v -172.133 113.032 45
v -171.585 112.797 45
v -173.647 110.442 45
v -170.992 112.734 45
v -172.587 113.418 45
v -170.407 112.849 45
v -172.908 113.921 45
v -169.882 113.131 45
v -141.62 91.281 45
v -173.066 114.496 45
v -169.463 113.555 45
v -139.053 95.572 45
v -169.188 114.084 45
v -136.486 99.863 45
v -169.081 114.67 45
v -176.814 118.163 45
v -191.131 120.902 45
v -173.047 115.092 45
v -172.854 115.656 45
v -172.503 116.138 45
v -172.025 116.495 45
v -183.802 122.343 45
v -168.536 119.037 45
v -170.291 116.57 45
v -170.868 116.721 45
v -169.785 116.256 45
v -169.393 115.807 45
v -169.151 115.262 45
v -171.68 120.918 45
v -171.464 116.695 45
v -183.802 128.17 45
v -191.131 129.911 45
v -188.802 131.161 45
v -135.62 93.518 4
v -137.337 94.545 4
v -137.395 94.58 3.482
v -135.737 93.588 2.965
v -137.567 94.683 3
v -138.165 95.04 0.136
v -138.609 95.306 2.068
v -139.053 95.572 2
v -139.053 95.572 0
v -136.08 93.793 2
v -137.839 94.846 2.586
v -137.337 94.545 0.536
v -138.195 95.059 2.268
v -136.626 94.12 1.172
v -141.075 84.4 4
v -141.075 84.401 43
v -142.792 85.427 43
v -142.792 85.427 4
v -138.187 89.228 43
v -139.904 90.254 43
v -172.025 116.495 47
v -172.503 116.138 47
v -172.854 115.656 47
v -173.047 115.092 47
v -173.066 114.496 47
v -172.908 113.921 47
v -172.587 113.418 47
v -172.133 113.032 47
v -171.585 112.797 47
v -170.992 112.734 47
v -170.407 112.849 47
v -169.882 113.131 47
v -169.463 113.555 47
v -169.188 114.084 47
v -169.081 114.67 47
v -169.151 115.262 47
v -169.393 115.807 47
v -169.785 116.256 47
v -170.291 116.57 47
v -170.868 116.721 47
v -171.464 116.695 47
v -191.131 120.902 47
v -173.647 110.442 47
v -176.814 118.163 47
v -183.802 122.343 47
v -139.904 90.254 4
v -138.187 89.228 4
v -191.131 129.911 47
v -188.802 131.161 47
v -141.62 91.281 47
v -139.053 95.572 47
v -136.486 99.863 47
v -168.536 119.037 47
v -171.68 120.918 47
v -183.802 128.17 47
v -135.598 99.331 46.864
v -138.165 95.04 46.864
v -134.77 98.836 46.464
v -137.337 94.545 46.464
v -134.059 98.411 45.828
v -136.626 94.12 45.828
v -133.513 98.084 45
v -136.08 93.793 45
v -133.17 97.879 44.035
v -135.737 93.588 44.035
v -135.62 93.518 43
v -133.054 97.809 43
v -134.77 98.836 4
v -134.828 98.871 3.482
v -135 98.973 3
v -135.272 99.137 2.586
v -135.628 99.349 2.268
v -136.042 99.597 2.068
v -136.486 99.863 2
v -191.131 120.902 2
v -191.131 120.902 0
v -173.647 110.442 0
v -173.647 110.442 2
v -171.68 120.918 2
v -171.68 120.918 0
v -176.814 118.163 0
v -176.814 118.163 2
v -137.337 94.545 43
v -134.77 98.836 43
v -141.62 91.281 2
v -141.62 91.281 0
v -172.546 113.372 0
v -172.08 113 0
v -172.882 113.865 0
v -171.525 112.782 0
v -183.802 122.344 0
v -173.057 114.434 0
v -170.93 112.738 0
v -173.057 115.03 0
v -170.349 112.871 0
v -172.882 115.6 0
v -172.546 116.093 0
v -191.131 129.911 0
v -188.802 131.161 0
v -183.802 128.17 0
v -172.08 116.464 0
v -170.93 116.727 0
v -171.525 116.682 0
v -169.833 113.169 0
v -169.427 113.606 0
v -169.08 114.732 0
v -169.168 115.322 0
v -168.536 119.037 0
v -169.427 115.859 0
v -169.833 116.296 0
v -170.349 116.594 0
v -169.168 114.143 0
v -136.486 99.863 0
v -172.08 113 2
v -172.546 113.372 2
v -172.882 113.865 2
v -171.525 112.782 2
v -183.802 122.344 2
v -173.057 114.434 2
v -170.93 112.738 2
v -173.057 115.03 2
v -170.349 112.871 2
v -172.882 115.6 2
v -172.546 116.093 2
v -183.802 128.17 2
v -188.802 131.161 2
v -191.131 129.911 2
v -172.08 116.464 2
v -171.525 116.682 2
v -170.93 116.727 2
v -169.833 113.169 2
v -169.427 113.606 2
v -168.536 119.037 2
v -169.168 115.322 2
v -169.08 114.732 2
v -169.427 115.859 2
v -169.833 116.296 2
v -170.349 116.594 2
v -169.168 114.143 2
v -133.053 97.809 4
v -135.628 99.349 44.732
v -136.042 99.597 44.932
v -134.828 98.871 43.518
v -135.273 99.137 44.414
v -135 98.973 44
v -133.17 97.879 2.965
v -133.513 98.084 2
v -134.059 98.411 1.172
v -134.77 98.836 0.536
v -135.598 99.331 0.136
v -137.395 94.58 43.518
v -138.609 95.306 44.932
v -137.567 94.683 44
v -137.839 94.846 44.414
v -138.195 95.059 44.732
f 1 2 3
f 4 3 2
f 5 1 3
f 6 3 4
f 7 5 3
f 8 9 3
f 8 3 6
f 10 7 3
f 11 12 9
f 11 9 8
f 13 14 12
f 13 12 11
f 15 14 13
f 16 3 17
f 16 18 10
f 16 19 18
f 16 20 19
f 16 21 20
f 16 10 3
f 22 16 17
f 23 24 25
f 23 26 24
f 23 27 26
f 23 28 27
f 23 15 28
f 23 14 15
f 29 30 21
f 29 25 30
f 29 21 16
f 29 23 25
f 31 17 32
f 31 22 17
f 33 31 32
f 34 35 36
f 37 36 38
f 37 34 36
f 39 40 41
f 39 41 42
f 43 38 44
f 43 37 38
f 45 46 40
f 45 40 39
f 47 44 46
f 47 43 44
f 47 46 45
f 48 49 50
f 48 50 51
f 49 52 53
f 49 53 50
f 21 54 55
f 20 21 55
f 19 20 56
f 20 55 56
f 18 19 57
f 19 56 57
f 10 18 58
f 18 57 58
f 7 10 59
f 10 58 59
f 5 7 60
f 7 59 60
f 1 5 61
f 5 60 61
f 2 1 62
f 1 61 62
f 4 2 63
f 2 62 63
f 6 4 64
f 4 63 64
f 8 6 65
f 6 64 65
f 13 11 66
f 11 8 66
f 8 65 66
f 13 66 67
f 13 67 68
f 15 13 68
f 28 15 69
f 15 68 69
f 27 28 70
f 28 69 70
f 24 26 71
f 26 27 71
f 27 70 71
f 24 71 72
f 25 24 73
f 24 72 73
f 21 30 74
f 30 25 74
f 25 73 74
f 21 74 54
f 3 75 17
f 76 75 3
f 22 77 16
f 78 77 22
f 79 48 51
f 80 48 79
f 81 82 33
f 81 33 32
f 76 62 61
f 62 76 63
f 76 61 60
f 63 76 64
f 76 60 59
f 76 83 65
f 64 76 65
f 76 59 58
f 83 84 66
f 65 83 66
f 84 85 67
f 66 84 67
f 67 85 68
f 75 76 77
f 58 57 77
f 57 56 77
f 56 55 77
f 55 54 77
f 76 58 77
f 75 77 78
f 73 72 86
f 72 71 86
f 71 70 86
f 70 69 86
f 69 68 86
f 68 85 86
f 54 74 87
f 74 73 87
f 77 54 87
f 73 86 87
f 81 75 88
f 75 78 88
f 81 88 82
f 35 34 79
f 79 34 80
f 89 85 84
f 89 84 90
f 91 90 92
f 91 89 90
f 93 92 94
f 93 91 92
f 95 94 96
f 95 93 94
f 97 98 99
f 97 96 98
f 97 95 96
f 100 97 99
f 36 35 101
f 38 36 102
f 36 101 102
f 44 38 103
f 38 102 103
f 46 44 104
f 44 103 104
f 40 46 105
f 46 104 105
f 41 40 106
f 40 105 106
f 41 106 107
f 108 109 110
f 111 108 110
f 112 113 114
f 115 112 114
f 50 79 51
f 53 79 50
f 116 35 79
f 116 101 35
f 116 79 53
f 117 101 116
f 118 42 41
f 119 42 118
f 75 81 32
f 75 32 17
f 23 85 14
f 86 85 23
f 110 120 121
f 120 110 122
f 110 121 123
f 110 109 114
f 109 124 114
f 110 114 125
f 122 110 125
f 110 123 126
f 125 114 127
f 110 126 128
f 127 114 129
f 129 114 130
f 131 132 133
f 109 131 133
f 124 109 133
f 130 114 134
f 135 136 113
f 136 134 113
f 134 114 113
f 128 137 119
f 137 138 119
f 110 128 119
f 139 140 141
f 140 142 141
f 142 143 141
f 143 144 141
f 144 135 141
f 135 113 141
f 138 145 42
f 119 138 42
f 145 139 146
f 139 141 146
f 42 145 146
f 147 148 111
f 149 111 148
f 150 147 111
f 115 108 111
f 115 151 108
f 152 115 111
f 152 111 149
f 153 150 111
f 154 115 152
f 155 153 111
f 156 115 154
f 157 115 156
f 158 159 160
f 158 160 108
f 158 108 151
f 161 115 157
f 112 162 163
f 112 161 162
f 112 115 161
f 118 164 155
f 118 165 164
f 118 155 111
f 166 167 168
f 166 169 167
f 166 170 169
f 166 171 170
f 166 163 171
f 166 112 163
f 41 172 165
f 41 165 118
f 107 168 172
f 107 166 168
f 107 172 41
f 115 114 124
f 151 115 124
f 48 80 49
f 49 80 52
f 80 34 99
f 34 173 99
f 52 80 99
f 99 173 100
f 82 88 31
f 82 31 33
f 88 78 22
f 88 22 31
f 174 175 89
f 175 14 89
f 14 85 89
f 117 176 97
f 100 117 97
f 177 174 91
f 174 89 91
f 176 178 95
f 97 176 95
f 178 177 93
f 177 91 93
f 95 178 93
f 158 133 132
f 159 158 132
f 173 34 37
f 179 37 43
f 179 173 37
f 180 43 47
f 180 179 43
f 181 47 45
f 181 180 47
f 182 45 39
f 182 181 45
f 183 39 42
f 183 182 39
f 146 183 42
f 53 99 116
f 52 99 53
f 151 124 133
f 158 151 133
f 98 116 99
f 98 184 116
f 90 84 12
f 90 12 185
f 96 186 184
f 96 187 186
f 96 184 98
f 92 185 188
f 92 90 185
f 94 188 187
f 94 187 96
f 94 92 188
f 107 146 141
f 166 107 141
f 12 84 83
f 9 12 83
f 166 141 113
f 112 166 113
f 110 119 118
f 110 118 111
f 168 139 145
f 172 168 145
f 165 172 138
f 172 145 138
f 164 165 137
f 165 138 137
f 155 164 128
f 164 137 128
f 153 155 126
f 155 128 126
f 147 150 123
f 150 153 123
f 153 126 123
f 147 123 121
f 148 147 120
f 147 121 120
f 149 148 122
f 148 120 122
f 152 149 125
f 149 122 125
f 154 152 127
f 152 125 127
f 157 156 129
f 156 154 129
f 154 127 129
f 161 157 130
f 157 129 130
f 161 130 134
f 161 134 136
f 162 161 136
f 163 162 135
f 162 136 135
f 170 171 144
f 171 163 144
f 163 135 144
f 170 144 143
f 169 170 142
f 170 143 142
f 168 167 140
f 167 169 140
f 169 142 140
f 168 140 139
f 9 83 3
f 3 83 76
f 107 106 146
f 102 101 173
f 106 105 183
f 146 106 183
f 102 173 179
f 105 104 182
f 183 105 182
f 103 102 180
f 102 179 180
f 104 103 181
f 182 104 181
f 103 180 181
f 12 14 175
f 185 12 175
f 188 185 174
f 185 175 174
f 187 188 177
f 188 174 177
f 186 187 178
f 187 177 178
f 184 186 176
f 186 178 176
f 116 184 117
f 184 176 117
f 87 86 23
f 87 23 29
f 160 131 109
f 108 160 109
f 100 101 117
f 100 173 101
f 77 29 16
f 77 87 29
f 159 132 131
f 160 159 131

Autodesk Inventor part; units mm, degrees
ref_plane "YZ Plane" through (0, 0, 0) normal (1, 0, 0) x (0, 1, 0)
ref_plane "XZ Plane" through (0, 0, 0) normal (0, 1, 0) x (-1, 0, 0)
ref_plane "XY Plane" through (0, 0, 0) normal (0, 0, 1) x (1, 0, 0)
sketch "Sketch3" plane through (0, 0, 0) normal (0, 0, 1) x (1, 0, 0)
  circle A0 centre (367.816, 50) radius 50 construction
  line L0 (367.816, 0) -> (512.7041, 0) construction
  line L1 (367.816, 50) -> (512.7041, 50) construction
  line L2 (367.816, 100) -> (512.7041, 100) construction
  line L3 (367.816, 50) -> (342.816, 6.6987) construction
  line L4 (367.816, 50) -> (324.5147, 25) construction
  line L5 (367.816, 50) -> (324.5147, 75) construction
  line L6 (342.816, 93.3013) -> (367.816, 50) construction
  line L7 (392.816, 93.3013) -> (367.816, 50) construction
  line L8 (411.1173, 75) -> (367.816, 50) construction
  line L9 (411.1173, 25) -> (367.816, 50) construction
  line L10 (392.816, 6.6987) -> (367.816, 50) construction
  line L11 (367.816, 0) -> (367.816, 100) construction
  line L12 (417.816, 50) -> (367.816, 50) construction
  line L13 (341.6361, 0) -> (341.6361, 100) construction
  line L14 (315.4561, 0) -> (315.4561, 100) construction
  line L15 (289.2762, 0) -> (289.2762, 100) construction
  line L16 (263.0963, 0) -> (263.0963, 100) construction
  line L17 (236.9163, 0) -> (236.9163, 100) construction
  line L18 (210.7364, 0) -> (210.7364, 100) construction
  line L19 (184.5564, 0) -> (184.5564, 100) construction
  line L20 (158.3765, 0) -> (158.3765, 100) construction
  circle A1 centre (315.4561, 50) radius 50 construction
  circle A2 centre (341.6361, 50) radius 50 construction
  circle A3 centre (289.2762, 50) radius 50 construction
  circle A4 centre (263.0963, 50) radius 50 construction
  circle A5 centre (236.9163, 50) radius 50 construction
  circle A6 centre (210.7364, 50) radius 50 construction
  line L21 (392.816, 6.6987) -> (512.7041, 6.6987) construction
  line L22 (411.1173, 25) -> (512.7041, 25) construction
  line L23 (411.1173, 75) -> (512.7041, 75) construction
  line L24 (411.1173, 75) -> (512.7041, 75) construction
  line L25 (392.816, 93.3013) -> (512.7041, 93.3013) construction
  line L26 (358.7574, 75) -> (339.2762, 50) construction
  line L27 (339.2762, 50) -> (306.3975, 25) construction
  line L28 (306.3975, 25) -> (261.9163, 6.6987) construction
  line L29 (261.9163, 6.6987) -> (210.7364, 0) construction
  line L30 (105.3682, -12.9392) -> (105.3682, 124.4333) construction
  line L31 (21.25, 0) -> (21.25, 12)
  line L32 (35.45, 12) -> (35.45, -11.8433)
  arc A7 (0, 0) -> (6.625, -9.8433) centre (10.625, 0) ccw
  arc A8 (14.625, -9.8433) -> (21.25, 0) centre (10.625, 0) ccw
  line L33 (35.45, -11.8433) -> (14.625, -11.8433)
  line L34 (6.625, -11.8433) -> (-195.0796, -11.8433)
  circle A9 centre (-144.26, 100.8473) radius 12.875 construction
  line L35 (6.625, -11.8433) -> (6.625, -9.8433)
  line L36 (14.625, -11.8433) -> (14.625, -9.8433)
  line L37 (411.1173, 75) -> (158.3765, 75) construction
  line L38 (367.816, 100) -> (158.3765, 100) construction
  line L39 (417.816, 50) -> (158.3765, 50) construction
  line L40 (411.1173, 25) -> (158.3765, 25) construction
  line L41 (392.816, 6.6987) -> (158.3765, 6.6987) construction
  line L42 (392.816, 93.3013) -> (158.3765, 93.3013) construction
  line L43 (358.7574, 75) -> (366.6361, 93.3013) construction
  line L44 (366.6361, 93.3013) -> (367.816, 100) construction
  spline S0 degree 4 poles (-157.0796, 100) (-157.0796, 88.9946) (-147.011, 72.6811) (-131.8577, 48.7932) (-88.4777, 17.6268) (-50.0176, 3.937) (-18.8717, 0) (0, 0) knots 0 0 0 0 0 0.264547 0.457223 0.66608 1 1 1 1 1
  line L45 (-157.0796, 100) -> (-157.0796, 38) construction
  line L46 (0, 0) -> (-157.0796, 0) construction
  line L47 (-144.26, 100.8473) -> (-157.135, 100.8473) construction
  circle A10 centre (-146.4546, 100) radius 10.625 construction
  line L48 (-146.4546, 100) -> (-157.0796, 100) construction
  line L49 (-141.0754, 84.4005) -> (-135.6205, 93.5183) construction
  line L50 (-141.0796, 132.0528) -> (-171.0796, 149.3733) construction
  line L51 (-171.0796, 149.3733) -> (-201.0796, 132.0528) construction
  line L52 (-141.0754, 84.4005) -> (-99.2801, 84.4005) construction
  line L53 (-201.0796, 132.0528) -> (-201.0796, 97.4118) construction
  line L54 (-201.0796, 97.4118) -> (-171.0796, 80.0913) construction
  line L55 (0, 0) -> (-157.0796, 93.9753) construction
  line L56 (-135.6205, 93.5183) -> (-137.3368, 94.5451) construction
  line L57 (-137.3368, 94.5451) -> (-143.2815, 84.6085) construction
  line L58 (-137.3368, 94.5451) -> (-171.0796, 114.7323) construction
  line L59 (-201.0796, 132.0528) -> (-171.0796, 114.7323) construction
  arc A11 (-137.3368, 94.5451) -> (-144.7045, 143.8948) centre (-171.0796, 114.7323) ccw construction
  arc A12 (-142.7917, 85.4273) -> (-147.1443, 147.6882) centre (-171.0796, 114.7323) ccw construction
  line L60 (-171.0796, 80.0913) -> (-171.0796, 35)
  circle A13 centre (-171.0796, 114.7323) radius 2.5 construction
  arc A14 (-167.4345, 120.8251) -> (-174.7248, 108.6394) centre (-171.0796, 114.7323) ccw construction
  line L61 (-167.4345, 120.8251) -> (-157.0796, 114.6302) construction
  line L62 (-171.0796, 80.0913) -> (-171.0796, 106.4587)
  line L63 (-171.0796, 106.4587) -> (-174.7248, 108.6394) construction
  line L64 (-171.0796, 35) -> (-191.5296, 23.1932)
  arc A15 (-191.5296, 23.1932) -> (-195.0796, 17.0444) centre (-187.9796, 17.0444) ccw
  line L65 (-195.0796, 17.0444) -> (-195.0796, -11.8433)
  arc A16 (35.45, 12) -> (21.25, 12) centre (28.35, 12) ccw
  line L66 (-157.0796, 114.6302) -> (-157.0796, 99.9865) construction
  circle A17 centre (-164.0796, 103.4587) radius 2.5
  line L67 (-171.0796, 103.4587) -> (-157.0796, 103.4587) construction
  circle A18 centre (-185.1284, 15.3983) radius 2.5
  line L68 (-185.1284, 15.3983) -> (-194.1284, 20.5944) construction
  circle A19 centre (-6, -5.9217) radius 2.5
  line L69 (-6, -11.8433) -> (-6, 0) construction
  circle A20 centre (28.35, 12) radius 2.5
  circle A21 centre (28.35, -5.9217) radius 2.5
  line L70 (-167.4345, 320.8251) -> (-157.0796, 314.6302) construction
  arc A22 (-167.4345, 320.8251) -> (-174.7248, 308.6394) centre (-171.0796, 314.7323) ccw construction
  circle A23 centre (-171.0796, 314.7323) radius 2.5 construction
  line L71 (-171.0796, 280.0913) -> (-171.0796, 306.4587)
  line L72 (-171.0796, 306.4587) -> (-174.7248, 308.6394) construction
  line L73 (-157.0796, 314.6302) -> (-157.0796, 299.9865) construction
  circle A24 centre (-164.0796, 303.4587) radius 2.5
  spline S1 degree 4 poles (-157.0796, 300) (-157.0796, 288.9946) (-147.0234, 272.6841) (-124.1789, 236.7977) (-70.8039, 208.0704) (-31.8865, 200.2943) (0, 200) knots 0 0 0 0 0 0.264547 0.457223 1 1 1 1 1 construction
  line L74 (-157.0796, 300) -> (-157.0796, 238) construction
  arc A25 (0, 200) -> (6.625, 190.1567) centre (10.625, 200) ccw
  line L75 (35.45, 212) -> (35.45, 188.1567)
  circle A26 centre (28.35, 212) radius 2.5
  circle A27 centre (28.35, 194.0783) radius 2.5
  arc A28 (35.45, 212) -> (21.25, 212) centre (28.35, 212) ccw
  line L76 (21.25, 200) -> (21.25, 212)
  line L77 (35.45, 188.1567) -> (14.625, 188.1567)
  arc A29 (14.625, 190.1567) -> (21.25, 200) centre (10.625, 200) ccw
  line L78 (14.625, 188.1567) -> (14.625, 190.1567)
  line L79 (-185.1284, 215.3983) -> (-194.1284, 220.5944) construction
  arc A30 (-191.5296, 223.1932) -> (-195.0796, 217.0444) centre (-187.9796, 217.0444) ccw
  line L80 (-195.0796, 217.0444) -> (-195.0796, 188.1567)
  line L81 (-171.0796, 235) -> (-191.5296, 223.1932)
  circle A31 centre (-185.1284, 215.3983) radius 2.5
  line L82 (-171.0796, 280.0913) -> (-171.0796, 235)
  line L83 (6.625, 188.1567) -> (-195.0796, 188.1567)
  line L84 (6.625, 188.1567) -> (6.625, 190.1567)
  line L85 (-137.3368, 294.5451) -> (-143.2815, 284.6085) construction
  line L86 (-141.0754, 284.4005) -> (-135.6205, 293.5183) construction
  line L87 (0, 200) -> (-157.0796, 293.9753)
  line L88 (-167.4345, 520.8251) -> (-157.0796, 514.6302) construction
  arc A32 (-167.4345, 520.8251) -> (-174.7248, 508.6394) centre (-171.0796, 514.7323) ccw construction
  circle A33 centre (-171.0796, 514.7323) radius 2.5 construction
  line L89 (-171.0796, 480.0913) -> (-171.0796, 506.4587)
  line L90 (-171.0796, 506.4587) -> (-174.7248, 508.6394) construction
  line L91 (-157.0796, 514.6302) -> (-157.0796, 499.9865) construction
  circle A34 centre (-164.0796, 503.4587) radius 2.5
  spline S2 degree 4 poles (-157.0796, 500) (-157.0796, 488.9946) (-147.0234, 472.6841) (-124.1789, 436.7977) (-70.8039, 408.0704) (-31.8865, 400.2943) (0, 400) knots 0 0 0 0 0 0.264547 0.457223 1 1 1 1 1 construction
  line L92 (-157.0796, 500) -> (-157.0796, 438)
  arc A35 (0, 400) -> (6.625, 390.1567) centre (10.625, 400) ccw
  line L93 (35.45, 412) -> (35.45, 388.1567)
  circle A36 centre (28.35, 412) radius 2.5
  circle A37 centre (28.35, 394.0783) radius 2.5
  arc A38 (35.45, 412) -> (21.25, 412) centre (28.35, 412) ccw
  line L94 (21.25, 400) -> (21.25, 412)
  line L95 (35.45, 388.1567) -> (14.625, 388.1567)
  arc A39 (14.625, 390.1567) -> (21.25, 400) centre (10.625, 400) ccw
  line L96 (14.625, 388.1567) -> (14.625, 390.1567)
  line L97 (-185.1284, 415.3983) -> (-194.1284, 420.5944) construction
  arc A40 (-191.5296, 423.1932) -> (-195.0796, 417.0444) centre (-187.9796, 417.0444) ccw
  line L98 (-195.0796, 417.0444) -> (-195.0796, 388.1567)
  line L99 (-171.0796, 435) -> (-191.5296, 423.1932)
  circle A41 centre (-185.1284, 415.3983) radius 2.5
  line L100 (-171.0796, 480.0913) -> (-171.0796, 435)
  line L101 (6.625, 388.1567) -> (-195.0796, 388.1567)
  line L102 (6.625, 388.1567) -> (6.625, 390.1567)
  line L103 (-137.3368, 494.5451) -> (-143.2815, 484.6085) construction
  line L104 (-141.0754, 484.4005) -> (-135.6205, 493.5183) construction
  line L105 (0, 400) -> (-157.0796, 493.9753) construction
  line L106 (-467.4345, 120.8251) -> (-457.0796, 114.6302) construction
  arc A42 (-467.4345, 120.8251) -> (-474.7248, 108.6394) centre (-471.0796, 114.7323) ccw construction
  circle A43 centre (-471.0796, 114.7323) radius 2.5 construction
  line L107 (-471.0796, 80.0913) -> (-471.0796, 106.4587)
  line L108 (-471.0796, 106.4587) -> (-474.7248, 108.6394) construction
  line L109 (-457.0796, 114.6302) -> (-457.0796, 99.9865) construction
  circle A44 centre (-464.0796, 103.4587) radius 2.5
  spline S3 degree 4 poles (-457.0796, 100) (-457.0796, 88.9946) (-447.0234, 72.6841) (-424.1789, 36.7977) (-370.8039, 8.0704) (-331.8865, 0.2943) (-300, 0) knots 0 0 0 0 0 0.264547 0.457223 1 1 1 1 1 construction
  line L110 (-457.0796, 100) -> (-457.0796, 38) construction
  arc A45 (-300, 0) -> (-293.375, -9.8433) centre (-289.375, 0) ccw construction
  line L111 (-264.55, 12) -> (-264.55, -11.8433)
  circle A46 centre (-271.65, 12) radius 2.5
  circle A47 centre (-271.65, -5.9217) radius 2.5
  arc A48 (-264.55, 12) -> (-278.75, 12) centre (-271.65, 12) ccw
  line L112 (-278.75, 0) -> (-278.75, 12) construction
  line L113 (-264.55, -11.8433) -> (-285.375, -11.8433)
  arc A49 (-285.375, -9.8433) -> (-278.75, 0) centre (-289.375, 0) ccw construction
  line L114 (-285.375, -11.8433) -> (-285.375, -9.8433) construction
  line L115 (-485.1284, 15.3983) -> (-494.1284, 20.5944) construction
  arc A50 (-491.5296, 23.1932) -> (-495.0796, 17.0444) centre (-487.9796, 17.0444) ccw
  line L116 (-495.0796, 17.0444) -> (-495.0796, -11.8433)
  line L117 (-471.0796, 35) -> (-491.5296, 23.1932)
  circle A51 centre (-485.1284, 15.3983) radius 2.5
  line L118 (-471.0796, 80.0913) -> (-471.0796, 35)
  line L119 (-293.375, -11.8433) -> (-495.0796, -11.8433)
  line L120 (-293.375, -11.8433) -> (-293.375, -9.8433) construction
  line L121 (-437.3368, 94.5451) -> (-443.2815, 84.6085) construction
  line L122 (-441.0754, 84.4005) -> (-435.6205, 93.5183) construction
  line L123 (-300, 0) -> (-457.0796, 93.9753) construction
  line L124 (-467.4345, 320.8251) -> (-457.0796, 314.6302) construction
  arc A52 (-467.4345, 320.8251) -> (-474.7248, 308.6394) centre (-471.0796, 314.7323) ccw construction
  circle A53 centre (-471.0796, 314.7323) radius 2.5 construction
  line L125 (-471.0796, 280.0913) -> (-471.0796, 306.4587)
  line L126 (-471.0796, 306.4587) -> (-474.7248, 308.6394) construction
  line L127 (-457.0796, 314.6302) -> (-457.0796, 299.9865) construction
  circle A54 centre (-464.0796, 303.4587) radius 2.5
  spline S4 degree 4 poles (-457.0796, 300) (-457.0796, 288.9946) (-447.0234, 272.6841) (-424.1789, 236.7977) (-370.8039, 208.0704) (-331.8865, 200.2943) (-300, 200) knots 0 0 0 0 0 0.264547 0.457223 1 1 1 1 1 construction
  line L128 (-457.0796, 300) -> (-457.0796, 238) construction
  arc A55 (-300, 200) -> (-293.375, 190.1567) centre (-289.375, 200) ccw construction
  line L129 (-264.55, 212) -> (-264.55, 188.1567)
  circle A56 centre (-271.65, 212) radius 2.5
  circle A57 centre (-271.65, 194.0783) radius 2.5
  arc A58 (-264.55, 212) -> (-278.75, 212) centre (-271.65, 212) ccw
  line L130 (-278.75, 200) -> (-278.75, 212) construction
  line L131 (-264.55, 188.1567) -> (-285.375, 188.1567)
  arc A59 (-285.375, 190.1567) -> (-278.75, 200) centre (-289.375, 200) ccw construction
  line L132 (-285.375, 188.1567) -> (-285.375, 190.1567) construction
  line L133 (-485.1284, 215.3983) -> (-494.1284, 220.5944) construction
  arc A60 (-491.5296, 223.1932) -> (-495.0796, 217.0444) centre (-487.9796, 217.0444) ccw
  line L134 (-495.0796, 217.0444) -> (-495.0796, 188.1567)
  line L135 (-471.0796, 235) -> (-491.5296, 223.1932)
  circle A61 centre (-485.1284, 215.3983) radius 2.5
  line L136 (-471.0796, 280.0913) -> (-471.0796, 235)
  line L137 (-293.375, 188.1567) -> (-495.0796, 188.1567)
  line L138 (-293.375, 188.1567) -> (-293.375, 190.1567) construction
  line L139 (-437.3368, 294.5451) -> (-443.2815, 284.6085) construction
  line L140 (-441.0754, 284.4005) -> (-435.6205, 293.5183) construction
  line L141 (-300, 200) -> (-457.0796, 293.9753) construction
  line L142 (-467.4345, 520.8251) -> (-457.0796, 514.6302)
  arc A62 (-467.4345, 520.8251) -> (-474.7248, 508.6394) centre (-471.0796, 514.7323) ccw
  circle A63 centre (-471.0796, 514.7323) radius 2.5
  line L143 (-471.0796, 480.0913) -> (-471.0796, 506.4587)
  line L144 (-471.0796, 506.4587) -> (-474.7248, 508.6394)
  line L145 (-457.0796, 514.6302) -> (-457.0796, 499.9865)
  circle A64 centre (-464.0796, 503.4587) radius 2.5
  spline S5 degree 4 poles (-457.0796, 500) (-457.0796, 488.9946) (-447.0234, 472.6841) (-424.1789, 436.7977) (-370.8039, 408.0704) (-331.8865, 400.2943) (-300, 400) knots 0 0 0 0 0 0.264547 0.457223 1 1 1 1 1 construction
  line L146 (-457.0796, 500) -> (-457.0796, 438) construction
  arc A65 (-300, 400) -> (-293.375, 390.1567) centre (-289.375, 400) ccw construction
  line L147 (-264.55, 412) -> (-264.55, 388.1567) construction
  circle A66 centre (-271.65, 412) radius 2.5
  circle A67 centre (-271.65, 394.0783) radius 2.5
  arc A68 (-264.55, 412) -> (-278.75, 412) centre (-271.65, 412) ccw
  line L148 (-278.75, 400) -> (-278.75, 412) construction
  line L149 (-264.55, 388.1567) -> (-285.375, 388.1567)
  arc A69 (-285.375, 390.1567) -> (-278.75, 400) centre (-289.375, 400) ccw construction
  line L150 (-285.375, 388.1567) -> (-285.375, 390.1567) construction
  line L151 (-485.1284, 415.3983) -> (-494.1284, 420.5944) construction
  arc A70 (-491.5296, 423.1932) -> (-495.0796, 417.0444) centre (-487.9796, 417.0444) ccw
  line L152 (-495.0796, 417.0444) -> (-495.0796, 388.1567) construction
  line L153 (-471.0796, 435) -> (-491.5296, 423.1932)
  circle A71 centre (-485.1284, 415.3983) radius 2.5
  line L154 (-471.0796, 480.0913) -> (-471.0796, 435)
  line L155 (-293.375, 388.1567) -> (-495.0796, 388.1567)
  line L156 (-293.375, 388.1567) -> (-293.375, 390.1567) construction
  line L157 (-437.3368, 494.5451) -> (-443.2815, 484.6085) construction
  line L158 (-441.0754, 484.4005) -> (-435.6205, 493.5183) construction
  line L159 (-300, 400) -> (-457.0796, 493.9753) construction
  line L160 (-435.4304, 87.048) -> (-430.3073, 83.9831)
  line L161 (-430.3073, 83.9831) -> (-430.3073, 78.0131)
  line L162 (-457.0796, 100) -> (-443.128, 91.6532)
  line L163 (-443.2208, 85.684) -> (-443.128, 91.6532)
  line L164 (-440.6463, 84.1438) -> (-435.4304, 87.048)
  line L165 (-440.6463, 84.1438) -> (-443.2208, 85.684)
  line L166 (-430.3073, 78.0131) -> (-436.0283, 74.7101)
  line L167 (-436.0283, 74.7101) -> (-436.0283, 68.1041)
  spline S6 degree 4 poles (-439.3753, 72.7777) (-420.1522, 45.3403) (-398.6357, 22.4496) (-337.1208, 4.2654) (-300, 5.1701) knots 0 0 0 0 0 1 1 1 1 1
  line L168 (-293.375, -11.8433) -> (-285.375, -11.8433)
  line L169 (-157.0796, 293.9753) -> (-157.0796, 300)
  line L170 (-293.375, 188.1567) -> (-285.375, 188.1567)
  arc A72 (-157.0796, 438) -> (-119.0796, 400) centre (-119.0796, 438) ccw
  line L171 (-119.0796, 400) -> (0, 400)
  line L172 (-457.0796, 500) -> (-457.0796, 438) construction
  line L173 (-419.0796, 400) -> (-300, 400) construction
  arc A73 (-457.0796, 438) -> (-419.0796, 400) centre (-419.0796, 438) ccw construction
  line L174 (-457.0796, 300) -> (-443.128, 291.6532)
  line L175 (-443.2208, 285.684) -> (-443.128, 291.6532)
  line L176 (-440.6463, 284.1438) -> (-443.2208, 285.684)
  line L177 (-440.6463, 284.1438) -> (-435.4304, 287.048)
  line L178 (-435.4304, 287.048) -> (-430.3073, 283.9831)
  line L179 (-430.3073, 283.9831) -> (-430.3073, 278.0131) construction
  line L180 (-430.3073, 278.0131) -> (-436.0283, 274.7101) construction
  line L181 (-457.0796, 500) -> (-443.128, 491.6532)
  line L182 (-443.2208, 485.684) -> (-443.128, 491.6532)
  line L183 (-440.6463, 484.1438) -> (-443.2208, 485.684)
  line L184 (-440.6463, 484.1438) -> (-435.4304, 487.048)
  line L185 (-435.4304, 487.048) -> (-430.3073, 483.9831)
  line L186 (-430.3073, 483.9831) -> (-430.3073, 478.0131)
  line L187 (-430.3073, 478.0131) -> (-436.0283, 474.7101)
  line L188 (-430.3073, 283.9831) -> (-298.5715, 205.1701)
  line L189 (-293.375, 388.1567) -> (-285.375, 388.1567)
  line L190 (-300, 5.1701) -> (-285.5799, 5.1701)
  arc A74 (-285.5799, 5.1701) -> (-278.75, 12) centre (-285.5799, 12) ccw
  line L191 (-298.5715, 205.1701) -> (-285.5799, 205.1701)
  arc A75 (-285.5799, 205.1701) -> (-278.75, 212) centre (-285.5799, 212) ccw
  line L192 (-436.0283, 474.7101) -> (-451.9095, 465.5411)
  line L193 (-451.9095, 465.5411) -> (-451.9095, 438)
  arc A76 (-451.9095, 438) -> (-419.0796, 405.1701) centre (-419.0796, 438) ccw
  line L194 (-419.0796, 405.1701) -> (-285.5799, 405.1701)
  arc A77 (-285.5799, 405.1701) -> (-278.75, 412) centre (-285.5799, 412) ccw
  line L195 (-495.0796, 388.1567) -> (-514.2796, 388.1567)
  line L196 (-514.2796, 388.1567) -> (-514.2796, 392.1567)
  line L197 (-514.2796, 392.1567) -> (-498.0796, 392.1567)
  arc A78 (-498.0796, 392.1567) -> (-495.0796, 395.1567) centre (-498.0796, 395.1567) ccw
  line L198 (-495.0796, 395.1567) -> (-495.0796, 417.0444)
  line L199 (-499.0796, 388.1567) -> (-510.2796, 388.1567) construction
  line L200 (-510.2796, 388.1567) -> (-510.2796, 392.1567) construction
  line L201 (-510.2796, 392.1567) -> (-499.0796, 392.1567) construction
  line L202 (-499.0796, 392.1567) -> (-499.0796, 388.1567) construction
  line L203 (-499.0796, 388.1567) -> (-510.2796, 392.1567) construction
  line L204 (-510.2796, 388.1567) -> (-499.0796, 392.1567) construction
  arc A79 (-600, 200) -> (-593.375, 190.1567) centre (-589.375, 200) ccw construction
  line L205 (-564.55, 212) -> (-564.55, 188.1567) construction
  circle A80 centre (-571.65, 212) radius 2.5
  circle A81 centre (-571.65, 194.0783) radius 2.5
  arc A82 (-564.55, 212) -> (-578.75, 212) centre (-571.65, 212) ccw
  line L206 (-578.75, 200) -> (-578.75, 212) construction
  line L207 (-564.55, 188.1567) -> (-585.375, 188.1567)
  arc A83 (-585.375, 190.1567) -> (-578.75, 200) centre (-589.375, 200) ccw construction
  line L208 (-585.375, 188.1567) -> (-585.375, 190.1567) construction
  line L209 (-593.375, 188.1567) -> (-593.375, 190.1567) construction
  arc A84 (-585.5799, 205.1701) -> (-578.75, 212) centre (-585.5799, 212) ccw
  line L210 (-593.375, 188.1567) -> (-585.375, 188.1567)
  line L211 (-598.5715, 205.1701) -> (-585.5799, 205.1701)
  arc A85 (-791.5296, 223.1932) -> (-795.0796, 217.0444) centre (-787.9796, 217.0444) ccw
  line L212 (-785.1284, 215.3983) -> (-794.1284, 220.5944) construction
  circle A86 centre (-785.1284, 215.3983) radius 2.5
  line L213 (-771.0796, 235) -> (-791.5296, 223.1932)
  line L214 (-795.0796, 217.0444) -> (-795.0796, 188.1567) construction
  line L215 (-730.3073, 278.0131) -> (-736.0283, 274.7101) construction
  line L216 (-757.0796, 300) -> (-757.0796, 238) construction
  line L217 (-730.3073, 283.9831) -> (-730.3073, 278.0131) construction
  line L218 (-730.3073, 283.9831) -> (-598.5715, 205.1701)
  line L219 (-600, 200) -> (-757.0796, 293.9753) construction
  spline S7 degree 4 poles (-757.0796, 300) (-757.0796, 288.9946) (-747.0234, 272.6841) (-724.1789, 236.7977) (-670.8039, 208.0704) (-631.8865, 200.2943) (-600, 200) knots 0 0 0 0 0 0.264547 0.457223 1 1 1 1 1 construction
  line L220 (-593.375, 188.1567) -> (-795.0796, 188.1567)
  line L221 (-771.0796, 280.0913) -> (-771.0796, 235)
  line L222 (-757.0796, 300) -> (-743.128, 291.6532)
  line L223 (-743.2208, 285.684) -> (-743.128, 291.6532)
  line L224 (-740.6463, 284.1438) -> (-743.2208, 285.684)
  line L225 (-737.3368, 294.5451) -> (-743.2815, 284.6085) construction
  line L226 (-741.0754, 284.4005) -> (-735.6205, 293.5183) construction
  line L227 (-740.6463, 284.1438) -> (-735.4304, 287.048)
  line L228 (-735.4304, 287.048) -> (-730.3073, 283.9831)
  line L229 (-767.4345, 320.8251) -> (-757.0796, 314.6302)
  line L230 (-771.0796, 280.0913) -> (-771.0796, 306.4587)
  line L231 (-757.0796, 314.6302) -> (-757.0796, 299.9865)
  circle A87 centre (-764.0796, 303.4587) radius 2.5
  line L232 (-771.0796, 306.4587) -> (-774.7248, 308.6394)
  circle A88 centre (-771.0796, 314.7323) radius 2.5
  arc A89 (-767.4345, 320.8251) -> (-774.7248, 308.6394) centre (-771.0796, 314.7323) ccw
  line L233 (-795.0796, 188.1567) -> (-814.2796, 188.1567)
  line L234 (-814.2796, 188.1567) -> (-814.2796, 192.1567)
  line L235 (-814.2796, 192.1567) -> (-798.0796, 192.1567)
  arc A90 (-798.0796, 192.1567) -> (-795.0796, 195.1567) centre (-798.0796, 195.1567) ccw
  line L236 (-795.0796, 195.1567) -> (-795.0796, 217.0444)
  line L237 (-799.0796, 188.1567) -> (-810.2796, 188.1567) construction
  line L238 (-810.2796, 188.1567) -> (-810.2796, 192.1567) construction
  line L239 (-810.2796, 192.1567) -> (-799.0796, 192.1567) construction
  line L240 (-799.0796, 192.1567) -> (-799.0796, 188.1567) construction
  line L241 (-799.0796, 188.1567) -> (-810.2796, 192.1567) construction
  line L242 (-810.2796, 188.1567) -> (-799.0796, 192.1567) construction
  line L243 (-495.0796, 587.6927) -> (-264.55, 587.6927) construction
  line L244 (-379.8148, 587.6927) -> (-379.8148, 614.3146) construction
  line L245 (-795.0796, 438) -> (-564.55, 438) construction
  line L246 (-679.8148, 438) -> (-679.8148, 492.8294) construction
  arc A91 (-564.55, 195.1567) -> (-561.55, 192.1567) centre (-561.55, 195.1567) ccw
  line L247 (-545.35, 192.1567) -> (-561.55, 192.1567)
  line L248 (-545.35, 188.1567) -> (-545.35, 192.1567)
  line L249 (-560.55, 192.1567) -> (-560.55, 188.1567) construction
  line L250 (-560.55, 188.1567) -> (-549.35, 188.1567) construction
  line L251 (-564.55, 188.1567) -> (-545.35, 188.1567)
  line L252 (-549.35, 188.1567) -> (-549.35, 192.1567) construction
  line L253 (-549.35, 192.1567) -> (-560.55, 192.1567) construction
  line L254 (-560.55, 188.1567) -> (-549.35, 192.1567) construction
  line L255 (-549.35, 188.1567) -> (-560.55, 192.1567) construction
  line L256 (-564.55, 195.1567) -> (-564.55, 212)
  circle A92 centre (-147.0796, 398.1567) radius 2.5
  circle A93 centre (-147.0796, 198.1567) radius 2.5
  circle A94 centre (-147.0796, -1.8433) radius 2.5
  circle A95 centre (-447.0796, 398.1567) radius 2.5
  circle A96 centre (-447.0796, 198.1567) radius 2.5
  circle A97 centre (-447.0796, -1.8433) radius 2.5
  circle A98 centre (-747.0796, 398.1567) radius 2.5 construction
  circle A99 centre (-747.0796, 198.1567) radius 2.5
  circle A100 centre (-747.0796, -1.8433) radius 2.5 construction
  line L257 (-264.55, 388.1567) -> (-245.35, 388.1567)
  line L258 (-245.35, 388.1567) -> (-245.35, 392.1567)
  line L259 (-245.35, 392.1567) -> (-261.55, 392.1567)
  arc A101 (-264.55, 395.1567) -> (-261.55, 392.1567) centre (-261.55, 395.1567) ccw
  line L260 (-260.55, 388.1567) -> (-249.35, 388.1567) construction
  line L261 (-249.35, 388.1567) -> (-249.35, 392.1567) construction
  line L262 (-249.35, 392.1567) -> (-260.55, 392.1567) construction
  line L263 (-260.55, 392.1567) -> (-260.55, 388.1567) construction
  line L264 (-260.55, 388.1567) -> (-249.35, 392.1567) construction
  line L265 (-249.35, 388.1567) -> (-260.55, 392.1567) construction
  line L266 (-264.55, 412) -> (-264.55, 395.1567)
  arc A102 (-157.0796, 106.4587) -> (-171.0796, 106.4587) centre (-164.0796, 106.4587) ccw
  line L267 (-157.0796, 106.4587) -> (-157.0796, 100)
  arc A103 (-157.0796, 306.4587) -> (-171.0796, 306.4587) centre (-164.0796, 306.4587) ccw
  line L268 (-157.0796, 306.4587) -> (-157.0796, 300)
  arc A104 (-157.0796, 506.4587) -> (-171.0796, 506.4587) centre (-164.0796, 506.4587) ccw
  line L269 (-157.0796, 506.4587) -> (-157.0796, 500)
  arc A105 (-457.0796, 106.4587) -> (-471.0796, 106.4587) centre (-464.0796, 106.4587) ccw
  line L270 (-457.0796, 106.4587) -> (-457.0796, 100)
  arc A106 (-457.0796, 306.4587) -> (-471.0796, 306.4587) centre (-464.0796, 306.4587) ccw
  line L271 (-457.0796, 306.4587) -> (-457.0796, 300)
  arc A107 (-457.0796, 506.4587) -> (-471.0796, 506.4587) centre (-464.0796, 506.4587) ccw construction
  line L272 (-457.0796, 506.4587) -> (-457.0796, 500) construction
  point P0 (158.3765, 0)
  point P1 (-148.021, 75)
  point P2 (-128.5398, 50)
  point P3 (-95.6611, 25)
  point P4 (-51.1799, 6.6987)
  point P5 (-155.8997, 93.3013)
  point P6 (-148.021, 275)
  point P7 (-128.5398, 250)
  point P8 (-95.6611, 225)
  point P9 (-51.1799, 206.6987)
  point P10 (-157.0796, 303.4587)
  point P11 (-157.0796, 200)
  point P12 (-171.0796, 303.4587)
  point P13 (-6, 188.1567)
  point P14 (-142.7917, 285.4273)
  point P15 (-148.021, 475)
  point P16 (-128.5398, 450)
  point P17 (-95.6611, 425)
  point P18 (-51.1799, 406.6987)
  point P19 (-157.0796, 503.4587)
  point P20 (-157.0796, 400)
  point P21 (-171.0796, 503.4587)
  point P22 (-6, 388.1567)
  point P23 (-142.7917, 485.4273)
  point P24 (-448.021, 75)
  point P25 (-428.5398, 50)
  point P26 (-395.6611, 25)
  point P27 (-351.1799, 6.6987)
  point P28 (-457.0796, 103.4587)
  point P29 (-457.0796, 0)
  point P30 (-471.0796, 103.4587)
  point P31 (-306, -11.8433)
  point P32 (-442.7917, 85.4273)
  point P33 (-448.021, 275)
  point P34 (-428.5398, 250)
  point P35 (-395.6611, 225)
  point P36 (-351.1799, 206.6987)
  point P37 (-457.0796, 303.4587)
  point P38 (-457.0796, 200)
  point P39 (-471.0796, 303.4587)
  point P40 (-306, 188.1567)
  point P41 (-442.7917, 285.4273)
  point P42 (-448.021, 475)
  point P43 (-428.5398, 450)
  point P44 (-395.6611, 425)
  point P45 (-351.1799, 406.6987)
  point P46 (-457.0796, 503.4587)
  point P47 (-457.0796, 400)
  point P48 (-471.0796, 503.4587)
  point P49 (-306, 388.1567)
  point P50 (-442.7917, 485.4273)
  point P51 (-421.2258, 50.7726)
  point P52 (-392.6255, 29.6644)
  point P53 (-346.6709, 11.6004)
  point P54 (-436.0267, 68.102)
  point P55 (-457.0796, 503.4587)
  point P56 (-504.6796, 390.1567)
  point P57 (-606, 188.1567)
  point P58 (-757.0796, 200)
  point P59 (-748.021, 275)
  point P60 (-728.5398, 250)
  point P61 (-757.0796, 303.4587)
  point P62 (-695.6611, 225)
  point P63 (-651.1799, 206.6987)
  point P64 (-742.7917, 285.4273)
  point P65 (-771.0796, 303.4587)
  point P66 (-804.6796, 190.1567)
  point P67 (-564.55, 188.1567)
  point P68 (-554.95, 190.1567)
  point P69 (-254.95, 390.1567)
  dimension "d43" = 25.75
  dimension "diameter" = 100
  dimension "d8" = 26.1799
  dimension "d14" = 30
  dimension "d15" = 30
  dimension "d16" = 30
  dimension "d32" = 10.625
  dimension "d47" = 8
  dimension "d49" = 2
  dimension "d53" = 21.25
  dimension "d62" = 20.825
  dimension "d123" = 120
  dimension "d126" = 59.109
  dimension "d137" = 2
  dimension "d138" = 90
  dimension "d139" = 90
  dimension "d141" = 7.1
  dimension "d142" = 14
  dimension "d143" = 7.1
  dimension "d144" = 12
  dimension "d145" = 5
  dimension "d146" = 35
  dimension "d147" = 24
  dimension "hole" = 5
  dimension "d155" = 5
  dimension "d156" = 9
  dimension "d157" = 5
  dimension "d158" = 6
  dimension "d159" = 5
  dimension "d160" = 5
  dimension "d241" = 120.891
  dimension "d244" = 120
  dimension "d245" = 30
  dimension "d246" = 3
  dimension "d249" = 200
  dimension "d252" = 300
  dimension "d255" = 120
  dimension "d256" = 5.1701
  dimension "d259" = 0.5
  dimension "d260" = 0.5
  dimension "d261" = 120
  dimension "d262" = 120
  dimension "d264" = 5.1701
  dimension "d265" = 38
  dimension "d268" = 300
  dimension "d275" = 200
  dimension "d288" = 5.1701
  dimension "d289" = 5.1701
  dimension "d290" = 5.1701
  dimension "d291" = 5.1701
  dimension "d292" = 11.2
  dimension "d293" = 4
  dimension "d294" = 4
  dimension "d296" = 3
  dimension "d299" = 300
  dimension "d324" = 11.2
  dimension "d325" = 4
  dimension "d326" = 4
  dimension "d328" = 3
  dimension "d330" = 5
  dimension "d331" = 10
  dimension "d332" = 10
  dimension "d335" = 200
  dimension "d338" = 300
  dimension "d341" = 7.1
  dimension "d342" = 4.6
sketch "Sketch5" plane through (0, 0, 0) normal (0, 0, 1) x (1, 0, 0)
  circle A0 centre (-171.0796, 114.7323) radius 2
  arc A1 (-168.5126, 119.023) -> (-173.6466, 110.4415) centre (-171.0796, 114.7323) ccw construction
  line L0 (-173.6466, 110.4415) -> (-168.5126, 119.023) construction
  line L1 (-173.6466, 110.4415) -> (-138.1894, 89.2287) construction
  line L2 (-134.2131, 98.5028) -> (-168.5126, 119.023) construction
  line L3 (-136.4861, 99.8627) -> (-168.5365, 119.0373)
  line L4 (-135.6205, 93.5183) -> (-169.3633, 113.7055) construction
  line L5 (-168.5365, 119.0373) -> (-171.6804, 120.9182)
  line L6 (-191.131, 120.9018) -> (-173.6466, 110.4415)
  line L7 (-141.6201, 91.2812) -> (-173.6466, 110.4415)
  arc A2 (-141.0754, 84.4005) -> (-138.014, 141.6941) centre (-171.0796, 114.7323) ccw construction
  line L8 (-137.3368, 94.5451) -> (-143.2815, 84.6085) construction
  line L9 (-141.0754, 84.4005) -> (-135.6205, 93.5183) construction
  line L10 (-133.0535, 97.8091) -> (-135.6205, 93.5183) construction
  line L11 (-171.6804, 120.9182) -> (-176.8144, 118.1632)
  line L12 (-176.8144, 118.1632) -> (-183.8017, 122.3435)
  line L13 (-183.8017, 122.3435) -> (-183.8017, 128.1699)
  line L14 (-183.8017, 128.1699) -> (-188.8017, 131.1613)
  line L15 (-188.8017, 131.1613) -> (-191.131, 129.9113)
  line L16 (-191.131, 129.9113) -> (-191.131, 120.9018)
  line L17 (-157.0796, 100) -> (-157.0796, 38) construction
  line L18 (-139.0531, 95.5719) -> (-141.6201, 91.2812)
  line L19 (-139.0531, 95.5719) -> (-136.4861, 99.8627) construction
  line L20 (-136.4861, 99.8627) -> (-133.7901, 98.2498)
  line L21 (-133.7901, 98.2498) -> (-136.3571, 93.959) construction
  line L22 (-136.3571, 93.959) -> (-139.0531, 95.5719)
  line L23 (-136.3571, 93.959) -> (-138.9241, 89.6683)
  line L24 (-138.9241, 89.6683) -> (-105.4563, 69.6457)
  line L25 (-133.7901, 98.2498) -> (-100.3223, 78.2271)
  line L26 (-122.1902, 79.657) -> (-117.0562, 88.2385)
  circle A3 centre (-68.1668, 53.1631) radius 2
  arc A4 (-70.7338, 48.8724) -> (-65.5998, 57.4539) centre (-68.1668, 53.1631) ccw construction
  line L27 (-70.7338, 48.8724) -> (-65.5998, 57.4539) construction
  line L28 (-70.7338, 48.8724) -> (-106.1911, 70.0852) construction
  line L29 (-99.8994, 77.9741) -> (-65.5998, 57.4539) construction
  line L30 (-97.6264, 76.6142) -> (-65.576, 57.4396)
  line L31 (-103.626, 74.3771) -> (-69.8831, 54.1899) construction
  line L32 (-65.576, 57.4396) -> (-62.4321, 55.5587)
  line L33 (-53.2495, 38.4121) -> (-70.7338, 48.8724)
  line L34 (-102.7604, 68.0328) -> (-70.7338, 48.8724)
  line L35 (-101.9097, 73.3503) -> (-107.8544, 63.4137) construction
  line L36 (-109.0809, 65.2593) -> (-103.626, 74.3771) construction
  line L37 (-62.4321, 55.5587) -> (-62.4321, 49.7322)
  line L38 (-62.4321, 49.7322) -> (-55.4448, 45.552)
  line L39 (-55.4448, 45.552) -> (-50.3108, 48.307)
  line L40 (-50.3108, 48.307) -> (-45.3108, 45.3156)
  line L41 (-45.3108, 45.3156) -> (-45.3108, 42.6722)
  line L42 (-45.3108, 42.6722) -> (-53.2495, 38.4121)
  line L43 (-100.1934, 72.3235) -> (-102.7604, 68.0328)
  line L44 (-100.1934, 72.3235) -> (-97.6264, 76.6142) construction
  line L45 (-102.8893, 73.9364) -> (-100.1934, 72.3235)
  line L46 (-102.8893, 73.9364) -> (-105.4563, 69.6457)
  line L47 (-97.6264, 76.6142) -> (-100.3223, 78.2271)
  line L48 (-105.4563, 69.6457) -> (-108.3442, 64.8186)
  line L49 (-108.3442, 64.8186) -> (-141.812, 84.8412)
  line L50 (-141.812, 84.8412) -> (-138.9241, 89.6683)
  line L51 (0, 0) -> (-157.0796, 93.9753) construction
  point P0 (-103.626, 74.3771)
  point P1 (-101.7882, 73.2776)
  point P2 (-87.7679, 58.5332)
  dimension "d346" = 4
  dimension "d347" = 3
  dimension "d364" = 59.109
  dimension "d365" = 5
  dimension "d366" = 25
  dimension "d377" = 66.3205
  dimension "d379" = 2
  dimension "d380" = 3.1416
  dimension "d381" = 39
extrude "Extrusion3" add sketch "Sketch5" along normal blind 2
sketch "Sketch11" plane through (0, 0, 2) normal (0, 0, 1) x (1, 0, 0)
  line L0 (-139.0531, 95.5719) -> (-136.3571, 93.959) projected
  line L1 (-139.0531, 95.5719) -> (-136.4861, 99.8627)
  line L2 (-100.1934, 72.3235) -> (-102.7604, 68.0328) projected
  line L3 (-62.4321, 55.5587) -> (-171.6804, 120.9182) projected
  point P0 (0, 0)
bend part "Bend Part5" radius 2 angle 90 line through (-139.0531, 95.5719, 2) along (0.5134007, 0.858149, 0) centre toward (0, 0, 1) moving side (0.858149, -0.5134007, 0) both sides no
sketch "Sketch13" plane through (-134.7698, 98.8359, 4) normal (-0.858149, 0.5134007, 0) x (0, 0, 1)
  line L0 (39, -5) -> (39, 0)
  line L1 (83.1535, 0) -> (0, 0) projected
  line L2 (39, -15.625) -> (39, -5) projected
  point P0 (-4, -15.625)
bend part "Bend Part7" radius 2 angle 90 line through (-137.3368, 94.5451, 43) along (0.5134007, 0.858149, 0) centre toward (-0.858149, 0.5134007, 0) moving side (0, 0, 1) both sides no
properties part number "6starter-v3"
